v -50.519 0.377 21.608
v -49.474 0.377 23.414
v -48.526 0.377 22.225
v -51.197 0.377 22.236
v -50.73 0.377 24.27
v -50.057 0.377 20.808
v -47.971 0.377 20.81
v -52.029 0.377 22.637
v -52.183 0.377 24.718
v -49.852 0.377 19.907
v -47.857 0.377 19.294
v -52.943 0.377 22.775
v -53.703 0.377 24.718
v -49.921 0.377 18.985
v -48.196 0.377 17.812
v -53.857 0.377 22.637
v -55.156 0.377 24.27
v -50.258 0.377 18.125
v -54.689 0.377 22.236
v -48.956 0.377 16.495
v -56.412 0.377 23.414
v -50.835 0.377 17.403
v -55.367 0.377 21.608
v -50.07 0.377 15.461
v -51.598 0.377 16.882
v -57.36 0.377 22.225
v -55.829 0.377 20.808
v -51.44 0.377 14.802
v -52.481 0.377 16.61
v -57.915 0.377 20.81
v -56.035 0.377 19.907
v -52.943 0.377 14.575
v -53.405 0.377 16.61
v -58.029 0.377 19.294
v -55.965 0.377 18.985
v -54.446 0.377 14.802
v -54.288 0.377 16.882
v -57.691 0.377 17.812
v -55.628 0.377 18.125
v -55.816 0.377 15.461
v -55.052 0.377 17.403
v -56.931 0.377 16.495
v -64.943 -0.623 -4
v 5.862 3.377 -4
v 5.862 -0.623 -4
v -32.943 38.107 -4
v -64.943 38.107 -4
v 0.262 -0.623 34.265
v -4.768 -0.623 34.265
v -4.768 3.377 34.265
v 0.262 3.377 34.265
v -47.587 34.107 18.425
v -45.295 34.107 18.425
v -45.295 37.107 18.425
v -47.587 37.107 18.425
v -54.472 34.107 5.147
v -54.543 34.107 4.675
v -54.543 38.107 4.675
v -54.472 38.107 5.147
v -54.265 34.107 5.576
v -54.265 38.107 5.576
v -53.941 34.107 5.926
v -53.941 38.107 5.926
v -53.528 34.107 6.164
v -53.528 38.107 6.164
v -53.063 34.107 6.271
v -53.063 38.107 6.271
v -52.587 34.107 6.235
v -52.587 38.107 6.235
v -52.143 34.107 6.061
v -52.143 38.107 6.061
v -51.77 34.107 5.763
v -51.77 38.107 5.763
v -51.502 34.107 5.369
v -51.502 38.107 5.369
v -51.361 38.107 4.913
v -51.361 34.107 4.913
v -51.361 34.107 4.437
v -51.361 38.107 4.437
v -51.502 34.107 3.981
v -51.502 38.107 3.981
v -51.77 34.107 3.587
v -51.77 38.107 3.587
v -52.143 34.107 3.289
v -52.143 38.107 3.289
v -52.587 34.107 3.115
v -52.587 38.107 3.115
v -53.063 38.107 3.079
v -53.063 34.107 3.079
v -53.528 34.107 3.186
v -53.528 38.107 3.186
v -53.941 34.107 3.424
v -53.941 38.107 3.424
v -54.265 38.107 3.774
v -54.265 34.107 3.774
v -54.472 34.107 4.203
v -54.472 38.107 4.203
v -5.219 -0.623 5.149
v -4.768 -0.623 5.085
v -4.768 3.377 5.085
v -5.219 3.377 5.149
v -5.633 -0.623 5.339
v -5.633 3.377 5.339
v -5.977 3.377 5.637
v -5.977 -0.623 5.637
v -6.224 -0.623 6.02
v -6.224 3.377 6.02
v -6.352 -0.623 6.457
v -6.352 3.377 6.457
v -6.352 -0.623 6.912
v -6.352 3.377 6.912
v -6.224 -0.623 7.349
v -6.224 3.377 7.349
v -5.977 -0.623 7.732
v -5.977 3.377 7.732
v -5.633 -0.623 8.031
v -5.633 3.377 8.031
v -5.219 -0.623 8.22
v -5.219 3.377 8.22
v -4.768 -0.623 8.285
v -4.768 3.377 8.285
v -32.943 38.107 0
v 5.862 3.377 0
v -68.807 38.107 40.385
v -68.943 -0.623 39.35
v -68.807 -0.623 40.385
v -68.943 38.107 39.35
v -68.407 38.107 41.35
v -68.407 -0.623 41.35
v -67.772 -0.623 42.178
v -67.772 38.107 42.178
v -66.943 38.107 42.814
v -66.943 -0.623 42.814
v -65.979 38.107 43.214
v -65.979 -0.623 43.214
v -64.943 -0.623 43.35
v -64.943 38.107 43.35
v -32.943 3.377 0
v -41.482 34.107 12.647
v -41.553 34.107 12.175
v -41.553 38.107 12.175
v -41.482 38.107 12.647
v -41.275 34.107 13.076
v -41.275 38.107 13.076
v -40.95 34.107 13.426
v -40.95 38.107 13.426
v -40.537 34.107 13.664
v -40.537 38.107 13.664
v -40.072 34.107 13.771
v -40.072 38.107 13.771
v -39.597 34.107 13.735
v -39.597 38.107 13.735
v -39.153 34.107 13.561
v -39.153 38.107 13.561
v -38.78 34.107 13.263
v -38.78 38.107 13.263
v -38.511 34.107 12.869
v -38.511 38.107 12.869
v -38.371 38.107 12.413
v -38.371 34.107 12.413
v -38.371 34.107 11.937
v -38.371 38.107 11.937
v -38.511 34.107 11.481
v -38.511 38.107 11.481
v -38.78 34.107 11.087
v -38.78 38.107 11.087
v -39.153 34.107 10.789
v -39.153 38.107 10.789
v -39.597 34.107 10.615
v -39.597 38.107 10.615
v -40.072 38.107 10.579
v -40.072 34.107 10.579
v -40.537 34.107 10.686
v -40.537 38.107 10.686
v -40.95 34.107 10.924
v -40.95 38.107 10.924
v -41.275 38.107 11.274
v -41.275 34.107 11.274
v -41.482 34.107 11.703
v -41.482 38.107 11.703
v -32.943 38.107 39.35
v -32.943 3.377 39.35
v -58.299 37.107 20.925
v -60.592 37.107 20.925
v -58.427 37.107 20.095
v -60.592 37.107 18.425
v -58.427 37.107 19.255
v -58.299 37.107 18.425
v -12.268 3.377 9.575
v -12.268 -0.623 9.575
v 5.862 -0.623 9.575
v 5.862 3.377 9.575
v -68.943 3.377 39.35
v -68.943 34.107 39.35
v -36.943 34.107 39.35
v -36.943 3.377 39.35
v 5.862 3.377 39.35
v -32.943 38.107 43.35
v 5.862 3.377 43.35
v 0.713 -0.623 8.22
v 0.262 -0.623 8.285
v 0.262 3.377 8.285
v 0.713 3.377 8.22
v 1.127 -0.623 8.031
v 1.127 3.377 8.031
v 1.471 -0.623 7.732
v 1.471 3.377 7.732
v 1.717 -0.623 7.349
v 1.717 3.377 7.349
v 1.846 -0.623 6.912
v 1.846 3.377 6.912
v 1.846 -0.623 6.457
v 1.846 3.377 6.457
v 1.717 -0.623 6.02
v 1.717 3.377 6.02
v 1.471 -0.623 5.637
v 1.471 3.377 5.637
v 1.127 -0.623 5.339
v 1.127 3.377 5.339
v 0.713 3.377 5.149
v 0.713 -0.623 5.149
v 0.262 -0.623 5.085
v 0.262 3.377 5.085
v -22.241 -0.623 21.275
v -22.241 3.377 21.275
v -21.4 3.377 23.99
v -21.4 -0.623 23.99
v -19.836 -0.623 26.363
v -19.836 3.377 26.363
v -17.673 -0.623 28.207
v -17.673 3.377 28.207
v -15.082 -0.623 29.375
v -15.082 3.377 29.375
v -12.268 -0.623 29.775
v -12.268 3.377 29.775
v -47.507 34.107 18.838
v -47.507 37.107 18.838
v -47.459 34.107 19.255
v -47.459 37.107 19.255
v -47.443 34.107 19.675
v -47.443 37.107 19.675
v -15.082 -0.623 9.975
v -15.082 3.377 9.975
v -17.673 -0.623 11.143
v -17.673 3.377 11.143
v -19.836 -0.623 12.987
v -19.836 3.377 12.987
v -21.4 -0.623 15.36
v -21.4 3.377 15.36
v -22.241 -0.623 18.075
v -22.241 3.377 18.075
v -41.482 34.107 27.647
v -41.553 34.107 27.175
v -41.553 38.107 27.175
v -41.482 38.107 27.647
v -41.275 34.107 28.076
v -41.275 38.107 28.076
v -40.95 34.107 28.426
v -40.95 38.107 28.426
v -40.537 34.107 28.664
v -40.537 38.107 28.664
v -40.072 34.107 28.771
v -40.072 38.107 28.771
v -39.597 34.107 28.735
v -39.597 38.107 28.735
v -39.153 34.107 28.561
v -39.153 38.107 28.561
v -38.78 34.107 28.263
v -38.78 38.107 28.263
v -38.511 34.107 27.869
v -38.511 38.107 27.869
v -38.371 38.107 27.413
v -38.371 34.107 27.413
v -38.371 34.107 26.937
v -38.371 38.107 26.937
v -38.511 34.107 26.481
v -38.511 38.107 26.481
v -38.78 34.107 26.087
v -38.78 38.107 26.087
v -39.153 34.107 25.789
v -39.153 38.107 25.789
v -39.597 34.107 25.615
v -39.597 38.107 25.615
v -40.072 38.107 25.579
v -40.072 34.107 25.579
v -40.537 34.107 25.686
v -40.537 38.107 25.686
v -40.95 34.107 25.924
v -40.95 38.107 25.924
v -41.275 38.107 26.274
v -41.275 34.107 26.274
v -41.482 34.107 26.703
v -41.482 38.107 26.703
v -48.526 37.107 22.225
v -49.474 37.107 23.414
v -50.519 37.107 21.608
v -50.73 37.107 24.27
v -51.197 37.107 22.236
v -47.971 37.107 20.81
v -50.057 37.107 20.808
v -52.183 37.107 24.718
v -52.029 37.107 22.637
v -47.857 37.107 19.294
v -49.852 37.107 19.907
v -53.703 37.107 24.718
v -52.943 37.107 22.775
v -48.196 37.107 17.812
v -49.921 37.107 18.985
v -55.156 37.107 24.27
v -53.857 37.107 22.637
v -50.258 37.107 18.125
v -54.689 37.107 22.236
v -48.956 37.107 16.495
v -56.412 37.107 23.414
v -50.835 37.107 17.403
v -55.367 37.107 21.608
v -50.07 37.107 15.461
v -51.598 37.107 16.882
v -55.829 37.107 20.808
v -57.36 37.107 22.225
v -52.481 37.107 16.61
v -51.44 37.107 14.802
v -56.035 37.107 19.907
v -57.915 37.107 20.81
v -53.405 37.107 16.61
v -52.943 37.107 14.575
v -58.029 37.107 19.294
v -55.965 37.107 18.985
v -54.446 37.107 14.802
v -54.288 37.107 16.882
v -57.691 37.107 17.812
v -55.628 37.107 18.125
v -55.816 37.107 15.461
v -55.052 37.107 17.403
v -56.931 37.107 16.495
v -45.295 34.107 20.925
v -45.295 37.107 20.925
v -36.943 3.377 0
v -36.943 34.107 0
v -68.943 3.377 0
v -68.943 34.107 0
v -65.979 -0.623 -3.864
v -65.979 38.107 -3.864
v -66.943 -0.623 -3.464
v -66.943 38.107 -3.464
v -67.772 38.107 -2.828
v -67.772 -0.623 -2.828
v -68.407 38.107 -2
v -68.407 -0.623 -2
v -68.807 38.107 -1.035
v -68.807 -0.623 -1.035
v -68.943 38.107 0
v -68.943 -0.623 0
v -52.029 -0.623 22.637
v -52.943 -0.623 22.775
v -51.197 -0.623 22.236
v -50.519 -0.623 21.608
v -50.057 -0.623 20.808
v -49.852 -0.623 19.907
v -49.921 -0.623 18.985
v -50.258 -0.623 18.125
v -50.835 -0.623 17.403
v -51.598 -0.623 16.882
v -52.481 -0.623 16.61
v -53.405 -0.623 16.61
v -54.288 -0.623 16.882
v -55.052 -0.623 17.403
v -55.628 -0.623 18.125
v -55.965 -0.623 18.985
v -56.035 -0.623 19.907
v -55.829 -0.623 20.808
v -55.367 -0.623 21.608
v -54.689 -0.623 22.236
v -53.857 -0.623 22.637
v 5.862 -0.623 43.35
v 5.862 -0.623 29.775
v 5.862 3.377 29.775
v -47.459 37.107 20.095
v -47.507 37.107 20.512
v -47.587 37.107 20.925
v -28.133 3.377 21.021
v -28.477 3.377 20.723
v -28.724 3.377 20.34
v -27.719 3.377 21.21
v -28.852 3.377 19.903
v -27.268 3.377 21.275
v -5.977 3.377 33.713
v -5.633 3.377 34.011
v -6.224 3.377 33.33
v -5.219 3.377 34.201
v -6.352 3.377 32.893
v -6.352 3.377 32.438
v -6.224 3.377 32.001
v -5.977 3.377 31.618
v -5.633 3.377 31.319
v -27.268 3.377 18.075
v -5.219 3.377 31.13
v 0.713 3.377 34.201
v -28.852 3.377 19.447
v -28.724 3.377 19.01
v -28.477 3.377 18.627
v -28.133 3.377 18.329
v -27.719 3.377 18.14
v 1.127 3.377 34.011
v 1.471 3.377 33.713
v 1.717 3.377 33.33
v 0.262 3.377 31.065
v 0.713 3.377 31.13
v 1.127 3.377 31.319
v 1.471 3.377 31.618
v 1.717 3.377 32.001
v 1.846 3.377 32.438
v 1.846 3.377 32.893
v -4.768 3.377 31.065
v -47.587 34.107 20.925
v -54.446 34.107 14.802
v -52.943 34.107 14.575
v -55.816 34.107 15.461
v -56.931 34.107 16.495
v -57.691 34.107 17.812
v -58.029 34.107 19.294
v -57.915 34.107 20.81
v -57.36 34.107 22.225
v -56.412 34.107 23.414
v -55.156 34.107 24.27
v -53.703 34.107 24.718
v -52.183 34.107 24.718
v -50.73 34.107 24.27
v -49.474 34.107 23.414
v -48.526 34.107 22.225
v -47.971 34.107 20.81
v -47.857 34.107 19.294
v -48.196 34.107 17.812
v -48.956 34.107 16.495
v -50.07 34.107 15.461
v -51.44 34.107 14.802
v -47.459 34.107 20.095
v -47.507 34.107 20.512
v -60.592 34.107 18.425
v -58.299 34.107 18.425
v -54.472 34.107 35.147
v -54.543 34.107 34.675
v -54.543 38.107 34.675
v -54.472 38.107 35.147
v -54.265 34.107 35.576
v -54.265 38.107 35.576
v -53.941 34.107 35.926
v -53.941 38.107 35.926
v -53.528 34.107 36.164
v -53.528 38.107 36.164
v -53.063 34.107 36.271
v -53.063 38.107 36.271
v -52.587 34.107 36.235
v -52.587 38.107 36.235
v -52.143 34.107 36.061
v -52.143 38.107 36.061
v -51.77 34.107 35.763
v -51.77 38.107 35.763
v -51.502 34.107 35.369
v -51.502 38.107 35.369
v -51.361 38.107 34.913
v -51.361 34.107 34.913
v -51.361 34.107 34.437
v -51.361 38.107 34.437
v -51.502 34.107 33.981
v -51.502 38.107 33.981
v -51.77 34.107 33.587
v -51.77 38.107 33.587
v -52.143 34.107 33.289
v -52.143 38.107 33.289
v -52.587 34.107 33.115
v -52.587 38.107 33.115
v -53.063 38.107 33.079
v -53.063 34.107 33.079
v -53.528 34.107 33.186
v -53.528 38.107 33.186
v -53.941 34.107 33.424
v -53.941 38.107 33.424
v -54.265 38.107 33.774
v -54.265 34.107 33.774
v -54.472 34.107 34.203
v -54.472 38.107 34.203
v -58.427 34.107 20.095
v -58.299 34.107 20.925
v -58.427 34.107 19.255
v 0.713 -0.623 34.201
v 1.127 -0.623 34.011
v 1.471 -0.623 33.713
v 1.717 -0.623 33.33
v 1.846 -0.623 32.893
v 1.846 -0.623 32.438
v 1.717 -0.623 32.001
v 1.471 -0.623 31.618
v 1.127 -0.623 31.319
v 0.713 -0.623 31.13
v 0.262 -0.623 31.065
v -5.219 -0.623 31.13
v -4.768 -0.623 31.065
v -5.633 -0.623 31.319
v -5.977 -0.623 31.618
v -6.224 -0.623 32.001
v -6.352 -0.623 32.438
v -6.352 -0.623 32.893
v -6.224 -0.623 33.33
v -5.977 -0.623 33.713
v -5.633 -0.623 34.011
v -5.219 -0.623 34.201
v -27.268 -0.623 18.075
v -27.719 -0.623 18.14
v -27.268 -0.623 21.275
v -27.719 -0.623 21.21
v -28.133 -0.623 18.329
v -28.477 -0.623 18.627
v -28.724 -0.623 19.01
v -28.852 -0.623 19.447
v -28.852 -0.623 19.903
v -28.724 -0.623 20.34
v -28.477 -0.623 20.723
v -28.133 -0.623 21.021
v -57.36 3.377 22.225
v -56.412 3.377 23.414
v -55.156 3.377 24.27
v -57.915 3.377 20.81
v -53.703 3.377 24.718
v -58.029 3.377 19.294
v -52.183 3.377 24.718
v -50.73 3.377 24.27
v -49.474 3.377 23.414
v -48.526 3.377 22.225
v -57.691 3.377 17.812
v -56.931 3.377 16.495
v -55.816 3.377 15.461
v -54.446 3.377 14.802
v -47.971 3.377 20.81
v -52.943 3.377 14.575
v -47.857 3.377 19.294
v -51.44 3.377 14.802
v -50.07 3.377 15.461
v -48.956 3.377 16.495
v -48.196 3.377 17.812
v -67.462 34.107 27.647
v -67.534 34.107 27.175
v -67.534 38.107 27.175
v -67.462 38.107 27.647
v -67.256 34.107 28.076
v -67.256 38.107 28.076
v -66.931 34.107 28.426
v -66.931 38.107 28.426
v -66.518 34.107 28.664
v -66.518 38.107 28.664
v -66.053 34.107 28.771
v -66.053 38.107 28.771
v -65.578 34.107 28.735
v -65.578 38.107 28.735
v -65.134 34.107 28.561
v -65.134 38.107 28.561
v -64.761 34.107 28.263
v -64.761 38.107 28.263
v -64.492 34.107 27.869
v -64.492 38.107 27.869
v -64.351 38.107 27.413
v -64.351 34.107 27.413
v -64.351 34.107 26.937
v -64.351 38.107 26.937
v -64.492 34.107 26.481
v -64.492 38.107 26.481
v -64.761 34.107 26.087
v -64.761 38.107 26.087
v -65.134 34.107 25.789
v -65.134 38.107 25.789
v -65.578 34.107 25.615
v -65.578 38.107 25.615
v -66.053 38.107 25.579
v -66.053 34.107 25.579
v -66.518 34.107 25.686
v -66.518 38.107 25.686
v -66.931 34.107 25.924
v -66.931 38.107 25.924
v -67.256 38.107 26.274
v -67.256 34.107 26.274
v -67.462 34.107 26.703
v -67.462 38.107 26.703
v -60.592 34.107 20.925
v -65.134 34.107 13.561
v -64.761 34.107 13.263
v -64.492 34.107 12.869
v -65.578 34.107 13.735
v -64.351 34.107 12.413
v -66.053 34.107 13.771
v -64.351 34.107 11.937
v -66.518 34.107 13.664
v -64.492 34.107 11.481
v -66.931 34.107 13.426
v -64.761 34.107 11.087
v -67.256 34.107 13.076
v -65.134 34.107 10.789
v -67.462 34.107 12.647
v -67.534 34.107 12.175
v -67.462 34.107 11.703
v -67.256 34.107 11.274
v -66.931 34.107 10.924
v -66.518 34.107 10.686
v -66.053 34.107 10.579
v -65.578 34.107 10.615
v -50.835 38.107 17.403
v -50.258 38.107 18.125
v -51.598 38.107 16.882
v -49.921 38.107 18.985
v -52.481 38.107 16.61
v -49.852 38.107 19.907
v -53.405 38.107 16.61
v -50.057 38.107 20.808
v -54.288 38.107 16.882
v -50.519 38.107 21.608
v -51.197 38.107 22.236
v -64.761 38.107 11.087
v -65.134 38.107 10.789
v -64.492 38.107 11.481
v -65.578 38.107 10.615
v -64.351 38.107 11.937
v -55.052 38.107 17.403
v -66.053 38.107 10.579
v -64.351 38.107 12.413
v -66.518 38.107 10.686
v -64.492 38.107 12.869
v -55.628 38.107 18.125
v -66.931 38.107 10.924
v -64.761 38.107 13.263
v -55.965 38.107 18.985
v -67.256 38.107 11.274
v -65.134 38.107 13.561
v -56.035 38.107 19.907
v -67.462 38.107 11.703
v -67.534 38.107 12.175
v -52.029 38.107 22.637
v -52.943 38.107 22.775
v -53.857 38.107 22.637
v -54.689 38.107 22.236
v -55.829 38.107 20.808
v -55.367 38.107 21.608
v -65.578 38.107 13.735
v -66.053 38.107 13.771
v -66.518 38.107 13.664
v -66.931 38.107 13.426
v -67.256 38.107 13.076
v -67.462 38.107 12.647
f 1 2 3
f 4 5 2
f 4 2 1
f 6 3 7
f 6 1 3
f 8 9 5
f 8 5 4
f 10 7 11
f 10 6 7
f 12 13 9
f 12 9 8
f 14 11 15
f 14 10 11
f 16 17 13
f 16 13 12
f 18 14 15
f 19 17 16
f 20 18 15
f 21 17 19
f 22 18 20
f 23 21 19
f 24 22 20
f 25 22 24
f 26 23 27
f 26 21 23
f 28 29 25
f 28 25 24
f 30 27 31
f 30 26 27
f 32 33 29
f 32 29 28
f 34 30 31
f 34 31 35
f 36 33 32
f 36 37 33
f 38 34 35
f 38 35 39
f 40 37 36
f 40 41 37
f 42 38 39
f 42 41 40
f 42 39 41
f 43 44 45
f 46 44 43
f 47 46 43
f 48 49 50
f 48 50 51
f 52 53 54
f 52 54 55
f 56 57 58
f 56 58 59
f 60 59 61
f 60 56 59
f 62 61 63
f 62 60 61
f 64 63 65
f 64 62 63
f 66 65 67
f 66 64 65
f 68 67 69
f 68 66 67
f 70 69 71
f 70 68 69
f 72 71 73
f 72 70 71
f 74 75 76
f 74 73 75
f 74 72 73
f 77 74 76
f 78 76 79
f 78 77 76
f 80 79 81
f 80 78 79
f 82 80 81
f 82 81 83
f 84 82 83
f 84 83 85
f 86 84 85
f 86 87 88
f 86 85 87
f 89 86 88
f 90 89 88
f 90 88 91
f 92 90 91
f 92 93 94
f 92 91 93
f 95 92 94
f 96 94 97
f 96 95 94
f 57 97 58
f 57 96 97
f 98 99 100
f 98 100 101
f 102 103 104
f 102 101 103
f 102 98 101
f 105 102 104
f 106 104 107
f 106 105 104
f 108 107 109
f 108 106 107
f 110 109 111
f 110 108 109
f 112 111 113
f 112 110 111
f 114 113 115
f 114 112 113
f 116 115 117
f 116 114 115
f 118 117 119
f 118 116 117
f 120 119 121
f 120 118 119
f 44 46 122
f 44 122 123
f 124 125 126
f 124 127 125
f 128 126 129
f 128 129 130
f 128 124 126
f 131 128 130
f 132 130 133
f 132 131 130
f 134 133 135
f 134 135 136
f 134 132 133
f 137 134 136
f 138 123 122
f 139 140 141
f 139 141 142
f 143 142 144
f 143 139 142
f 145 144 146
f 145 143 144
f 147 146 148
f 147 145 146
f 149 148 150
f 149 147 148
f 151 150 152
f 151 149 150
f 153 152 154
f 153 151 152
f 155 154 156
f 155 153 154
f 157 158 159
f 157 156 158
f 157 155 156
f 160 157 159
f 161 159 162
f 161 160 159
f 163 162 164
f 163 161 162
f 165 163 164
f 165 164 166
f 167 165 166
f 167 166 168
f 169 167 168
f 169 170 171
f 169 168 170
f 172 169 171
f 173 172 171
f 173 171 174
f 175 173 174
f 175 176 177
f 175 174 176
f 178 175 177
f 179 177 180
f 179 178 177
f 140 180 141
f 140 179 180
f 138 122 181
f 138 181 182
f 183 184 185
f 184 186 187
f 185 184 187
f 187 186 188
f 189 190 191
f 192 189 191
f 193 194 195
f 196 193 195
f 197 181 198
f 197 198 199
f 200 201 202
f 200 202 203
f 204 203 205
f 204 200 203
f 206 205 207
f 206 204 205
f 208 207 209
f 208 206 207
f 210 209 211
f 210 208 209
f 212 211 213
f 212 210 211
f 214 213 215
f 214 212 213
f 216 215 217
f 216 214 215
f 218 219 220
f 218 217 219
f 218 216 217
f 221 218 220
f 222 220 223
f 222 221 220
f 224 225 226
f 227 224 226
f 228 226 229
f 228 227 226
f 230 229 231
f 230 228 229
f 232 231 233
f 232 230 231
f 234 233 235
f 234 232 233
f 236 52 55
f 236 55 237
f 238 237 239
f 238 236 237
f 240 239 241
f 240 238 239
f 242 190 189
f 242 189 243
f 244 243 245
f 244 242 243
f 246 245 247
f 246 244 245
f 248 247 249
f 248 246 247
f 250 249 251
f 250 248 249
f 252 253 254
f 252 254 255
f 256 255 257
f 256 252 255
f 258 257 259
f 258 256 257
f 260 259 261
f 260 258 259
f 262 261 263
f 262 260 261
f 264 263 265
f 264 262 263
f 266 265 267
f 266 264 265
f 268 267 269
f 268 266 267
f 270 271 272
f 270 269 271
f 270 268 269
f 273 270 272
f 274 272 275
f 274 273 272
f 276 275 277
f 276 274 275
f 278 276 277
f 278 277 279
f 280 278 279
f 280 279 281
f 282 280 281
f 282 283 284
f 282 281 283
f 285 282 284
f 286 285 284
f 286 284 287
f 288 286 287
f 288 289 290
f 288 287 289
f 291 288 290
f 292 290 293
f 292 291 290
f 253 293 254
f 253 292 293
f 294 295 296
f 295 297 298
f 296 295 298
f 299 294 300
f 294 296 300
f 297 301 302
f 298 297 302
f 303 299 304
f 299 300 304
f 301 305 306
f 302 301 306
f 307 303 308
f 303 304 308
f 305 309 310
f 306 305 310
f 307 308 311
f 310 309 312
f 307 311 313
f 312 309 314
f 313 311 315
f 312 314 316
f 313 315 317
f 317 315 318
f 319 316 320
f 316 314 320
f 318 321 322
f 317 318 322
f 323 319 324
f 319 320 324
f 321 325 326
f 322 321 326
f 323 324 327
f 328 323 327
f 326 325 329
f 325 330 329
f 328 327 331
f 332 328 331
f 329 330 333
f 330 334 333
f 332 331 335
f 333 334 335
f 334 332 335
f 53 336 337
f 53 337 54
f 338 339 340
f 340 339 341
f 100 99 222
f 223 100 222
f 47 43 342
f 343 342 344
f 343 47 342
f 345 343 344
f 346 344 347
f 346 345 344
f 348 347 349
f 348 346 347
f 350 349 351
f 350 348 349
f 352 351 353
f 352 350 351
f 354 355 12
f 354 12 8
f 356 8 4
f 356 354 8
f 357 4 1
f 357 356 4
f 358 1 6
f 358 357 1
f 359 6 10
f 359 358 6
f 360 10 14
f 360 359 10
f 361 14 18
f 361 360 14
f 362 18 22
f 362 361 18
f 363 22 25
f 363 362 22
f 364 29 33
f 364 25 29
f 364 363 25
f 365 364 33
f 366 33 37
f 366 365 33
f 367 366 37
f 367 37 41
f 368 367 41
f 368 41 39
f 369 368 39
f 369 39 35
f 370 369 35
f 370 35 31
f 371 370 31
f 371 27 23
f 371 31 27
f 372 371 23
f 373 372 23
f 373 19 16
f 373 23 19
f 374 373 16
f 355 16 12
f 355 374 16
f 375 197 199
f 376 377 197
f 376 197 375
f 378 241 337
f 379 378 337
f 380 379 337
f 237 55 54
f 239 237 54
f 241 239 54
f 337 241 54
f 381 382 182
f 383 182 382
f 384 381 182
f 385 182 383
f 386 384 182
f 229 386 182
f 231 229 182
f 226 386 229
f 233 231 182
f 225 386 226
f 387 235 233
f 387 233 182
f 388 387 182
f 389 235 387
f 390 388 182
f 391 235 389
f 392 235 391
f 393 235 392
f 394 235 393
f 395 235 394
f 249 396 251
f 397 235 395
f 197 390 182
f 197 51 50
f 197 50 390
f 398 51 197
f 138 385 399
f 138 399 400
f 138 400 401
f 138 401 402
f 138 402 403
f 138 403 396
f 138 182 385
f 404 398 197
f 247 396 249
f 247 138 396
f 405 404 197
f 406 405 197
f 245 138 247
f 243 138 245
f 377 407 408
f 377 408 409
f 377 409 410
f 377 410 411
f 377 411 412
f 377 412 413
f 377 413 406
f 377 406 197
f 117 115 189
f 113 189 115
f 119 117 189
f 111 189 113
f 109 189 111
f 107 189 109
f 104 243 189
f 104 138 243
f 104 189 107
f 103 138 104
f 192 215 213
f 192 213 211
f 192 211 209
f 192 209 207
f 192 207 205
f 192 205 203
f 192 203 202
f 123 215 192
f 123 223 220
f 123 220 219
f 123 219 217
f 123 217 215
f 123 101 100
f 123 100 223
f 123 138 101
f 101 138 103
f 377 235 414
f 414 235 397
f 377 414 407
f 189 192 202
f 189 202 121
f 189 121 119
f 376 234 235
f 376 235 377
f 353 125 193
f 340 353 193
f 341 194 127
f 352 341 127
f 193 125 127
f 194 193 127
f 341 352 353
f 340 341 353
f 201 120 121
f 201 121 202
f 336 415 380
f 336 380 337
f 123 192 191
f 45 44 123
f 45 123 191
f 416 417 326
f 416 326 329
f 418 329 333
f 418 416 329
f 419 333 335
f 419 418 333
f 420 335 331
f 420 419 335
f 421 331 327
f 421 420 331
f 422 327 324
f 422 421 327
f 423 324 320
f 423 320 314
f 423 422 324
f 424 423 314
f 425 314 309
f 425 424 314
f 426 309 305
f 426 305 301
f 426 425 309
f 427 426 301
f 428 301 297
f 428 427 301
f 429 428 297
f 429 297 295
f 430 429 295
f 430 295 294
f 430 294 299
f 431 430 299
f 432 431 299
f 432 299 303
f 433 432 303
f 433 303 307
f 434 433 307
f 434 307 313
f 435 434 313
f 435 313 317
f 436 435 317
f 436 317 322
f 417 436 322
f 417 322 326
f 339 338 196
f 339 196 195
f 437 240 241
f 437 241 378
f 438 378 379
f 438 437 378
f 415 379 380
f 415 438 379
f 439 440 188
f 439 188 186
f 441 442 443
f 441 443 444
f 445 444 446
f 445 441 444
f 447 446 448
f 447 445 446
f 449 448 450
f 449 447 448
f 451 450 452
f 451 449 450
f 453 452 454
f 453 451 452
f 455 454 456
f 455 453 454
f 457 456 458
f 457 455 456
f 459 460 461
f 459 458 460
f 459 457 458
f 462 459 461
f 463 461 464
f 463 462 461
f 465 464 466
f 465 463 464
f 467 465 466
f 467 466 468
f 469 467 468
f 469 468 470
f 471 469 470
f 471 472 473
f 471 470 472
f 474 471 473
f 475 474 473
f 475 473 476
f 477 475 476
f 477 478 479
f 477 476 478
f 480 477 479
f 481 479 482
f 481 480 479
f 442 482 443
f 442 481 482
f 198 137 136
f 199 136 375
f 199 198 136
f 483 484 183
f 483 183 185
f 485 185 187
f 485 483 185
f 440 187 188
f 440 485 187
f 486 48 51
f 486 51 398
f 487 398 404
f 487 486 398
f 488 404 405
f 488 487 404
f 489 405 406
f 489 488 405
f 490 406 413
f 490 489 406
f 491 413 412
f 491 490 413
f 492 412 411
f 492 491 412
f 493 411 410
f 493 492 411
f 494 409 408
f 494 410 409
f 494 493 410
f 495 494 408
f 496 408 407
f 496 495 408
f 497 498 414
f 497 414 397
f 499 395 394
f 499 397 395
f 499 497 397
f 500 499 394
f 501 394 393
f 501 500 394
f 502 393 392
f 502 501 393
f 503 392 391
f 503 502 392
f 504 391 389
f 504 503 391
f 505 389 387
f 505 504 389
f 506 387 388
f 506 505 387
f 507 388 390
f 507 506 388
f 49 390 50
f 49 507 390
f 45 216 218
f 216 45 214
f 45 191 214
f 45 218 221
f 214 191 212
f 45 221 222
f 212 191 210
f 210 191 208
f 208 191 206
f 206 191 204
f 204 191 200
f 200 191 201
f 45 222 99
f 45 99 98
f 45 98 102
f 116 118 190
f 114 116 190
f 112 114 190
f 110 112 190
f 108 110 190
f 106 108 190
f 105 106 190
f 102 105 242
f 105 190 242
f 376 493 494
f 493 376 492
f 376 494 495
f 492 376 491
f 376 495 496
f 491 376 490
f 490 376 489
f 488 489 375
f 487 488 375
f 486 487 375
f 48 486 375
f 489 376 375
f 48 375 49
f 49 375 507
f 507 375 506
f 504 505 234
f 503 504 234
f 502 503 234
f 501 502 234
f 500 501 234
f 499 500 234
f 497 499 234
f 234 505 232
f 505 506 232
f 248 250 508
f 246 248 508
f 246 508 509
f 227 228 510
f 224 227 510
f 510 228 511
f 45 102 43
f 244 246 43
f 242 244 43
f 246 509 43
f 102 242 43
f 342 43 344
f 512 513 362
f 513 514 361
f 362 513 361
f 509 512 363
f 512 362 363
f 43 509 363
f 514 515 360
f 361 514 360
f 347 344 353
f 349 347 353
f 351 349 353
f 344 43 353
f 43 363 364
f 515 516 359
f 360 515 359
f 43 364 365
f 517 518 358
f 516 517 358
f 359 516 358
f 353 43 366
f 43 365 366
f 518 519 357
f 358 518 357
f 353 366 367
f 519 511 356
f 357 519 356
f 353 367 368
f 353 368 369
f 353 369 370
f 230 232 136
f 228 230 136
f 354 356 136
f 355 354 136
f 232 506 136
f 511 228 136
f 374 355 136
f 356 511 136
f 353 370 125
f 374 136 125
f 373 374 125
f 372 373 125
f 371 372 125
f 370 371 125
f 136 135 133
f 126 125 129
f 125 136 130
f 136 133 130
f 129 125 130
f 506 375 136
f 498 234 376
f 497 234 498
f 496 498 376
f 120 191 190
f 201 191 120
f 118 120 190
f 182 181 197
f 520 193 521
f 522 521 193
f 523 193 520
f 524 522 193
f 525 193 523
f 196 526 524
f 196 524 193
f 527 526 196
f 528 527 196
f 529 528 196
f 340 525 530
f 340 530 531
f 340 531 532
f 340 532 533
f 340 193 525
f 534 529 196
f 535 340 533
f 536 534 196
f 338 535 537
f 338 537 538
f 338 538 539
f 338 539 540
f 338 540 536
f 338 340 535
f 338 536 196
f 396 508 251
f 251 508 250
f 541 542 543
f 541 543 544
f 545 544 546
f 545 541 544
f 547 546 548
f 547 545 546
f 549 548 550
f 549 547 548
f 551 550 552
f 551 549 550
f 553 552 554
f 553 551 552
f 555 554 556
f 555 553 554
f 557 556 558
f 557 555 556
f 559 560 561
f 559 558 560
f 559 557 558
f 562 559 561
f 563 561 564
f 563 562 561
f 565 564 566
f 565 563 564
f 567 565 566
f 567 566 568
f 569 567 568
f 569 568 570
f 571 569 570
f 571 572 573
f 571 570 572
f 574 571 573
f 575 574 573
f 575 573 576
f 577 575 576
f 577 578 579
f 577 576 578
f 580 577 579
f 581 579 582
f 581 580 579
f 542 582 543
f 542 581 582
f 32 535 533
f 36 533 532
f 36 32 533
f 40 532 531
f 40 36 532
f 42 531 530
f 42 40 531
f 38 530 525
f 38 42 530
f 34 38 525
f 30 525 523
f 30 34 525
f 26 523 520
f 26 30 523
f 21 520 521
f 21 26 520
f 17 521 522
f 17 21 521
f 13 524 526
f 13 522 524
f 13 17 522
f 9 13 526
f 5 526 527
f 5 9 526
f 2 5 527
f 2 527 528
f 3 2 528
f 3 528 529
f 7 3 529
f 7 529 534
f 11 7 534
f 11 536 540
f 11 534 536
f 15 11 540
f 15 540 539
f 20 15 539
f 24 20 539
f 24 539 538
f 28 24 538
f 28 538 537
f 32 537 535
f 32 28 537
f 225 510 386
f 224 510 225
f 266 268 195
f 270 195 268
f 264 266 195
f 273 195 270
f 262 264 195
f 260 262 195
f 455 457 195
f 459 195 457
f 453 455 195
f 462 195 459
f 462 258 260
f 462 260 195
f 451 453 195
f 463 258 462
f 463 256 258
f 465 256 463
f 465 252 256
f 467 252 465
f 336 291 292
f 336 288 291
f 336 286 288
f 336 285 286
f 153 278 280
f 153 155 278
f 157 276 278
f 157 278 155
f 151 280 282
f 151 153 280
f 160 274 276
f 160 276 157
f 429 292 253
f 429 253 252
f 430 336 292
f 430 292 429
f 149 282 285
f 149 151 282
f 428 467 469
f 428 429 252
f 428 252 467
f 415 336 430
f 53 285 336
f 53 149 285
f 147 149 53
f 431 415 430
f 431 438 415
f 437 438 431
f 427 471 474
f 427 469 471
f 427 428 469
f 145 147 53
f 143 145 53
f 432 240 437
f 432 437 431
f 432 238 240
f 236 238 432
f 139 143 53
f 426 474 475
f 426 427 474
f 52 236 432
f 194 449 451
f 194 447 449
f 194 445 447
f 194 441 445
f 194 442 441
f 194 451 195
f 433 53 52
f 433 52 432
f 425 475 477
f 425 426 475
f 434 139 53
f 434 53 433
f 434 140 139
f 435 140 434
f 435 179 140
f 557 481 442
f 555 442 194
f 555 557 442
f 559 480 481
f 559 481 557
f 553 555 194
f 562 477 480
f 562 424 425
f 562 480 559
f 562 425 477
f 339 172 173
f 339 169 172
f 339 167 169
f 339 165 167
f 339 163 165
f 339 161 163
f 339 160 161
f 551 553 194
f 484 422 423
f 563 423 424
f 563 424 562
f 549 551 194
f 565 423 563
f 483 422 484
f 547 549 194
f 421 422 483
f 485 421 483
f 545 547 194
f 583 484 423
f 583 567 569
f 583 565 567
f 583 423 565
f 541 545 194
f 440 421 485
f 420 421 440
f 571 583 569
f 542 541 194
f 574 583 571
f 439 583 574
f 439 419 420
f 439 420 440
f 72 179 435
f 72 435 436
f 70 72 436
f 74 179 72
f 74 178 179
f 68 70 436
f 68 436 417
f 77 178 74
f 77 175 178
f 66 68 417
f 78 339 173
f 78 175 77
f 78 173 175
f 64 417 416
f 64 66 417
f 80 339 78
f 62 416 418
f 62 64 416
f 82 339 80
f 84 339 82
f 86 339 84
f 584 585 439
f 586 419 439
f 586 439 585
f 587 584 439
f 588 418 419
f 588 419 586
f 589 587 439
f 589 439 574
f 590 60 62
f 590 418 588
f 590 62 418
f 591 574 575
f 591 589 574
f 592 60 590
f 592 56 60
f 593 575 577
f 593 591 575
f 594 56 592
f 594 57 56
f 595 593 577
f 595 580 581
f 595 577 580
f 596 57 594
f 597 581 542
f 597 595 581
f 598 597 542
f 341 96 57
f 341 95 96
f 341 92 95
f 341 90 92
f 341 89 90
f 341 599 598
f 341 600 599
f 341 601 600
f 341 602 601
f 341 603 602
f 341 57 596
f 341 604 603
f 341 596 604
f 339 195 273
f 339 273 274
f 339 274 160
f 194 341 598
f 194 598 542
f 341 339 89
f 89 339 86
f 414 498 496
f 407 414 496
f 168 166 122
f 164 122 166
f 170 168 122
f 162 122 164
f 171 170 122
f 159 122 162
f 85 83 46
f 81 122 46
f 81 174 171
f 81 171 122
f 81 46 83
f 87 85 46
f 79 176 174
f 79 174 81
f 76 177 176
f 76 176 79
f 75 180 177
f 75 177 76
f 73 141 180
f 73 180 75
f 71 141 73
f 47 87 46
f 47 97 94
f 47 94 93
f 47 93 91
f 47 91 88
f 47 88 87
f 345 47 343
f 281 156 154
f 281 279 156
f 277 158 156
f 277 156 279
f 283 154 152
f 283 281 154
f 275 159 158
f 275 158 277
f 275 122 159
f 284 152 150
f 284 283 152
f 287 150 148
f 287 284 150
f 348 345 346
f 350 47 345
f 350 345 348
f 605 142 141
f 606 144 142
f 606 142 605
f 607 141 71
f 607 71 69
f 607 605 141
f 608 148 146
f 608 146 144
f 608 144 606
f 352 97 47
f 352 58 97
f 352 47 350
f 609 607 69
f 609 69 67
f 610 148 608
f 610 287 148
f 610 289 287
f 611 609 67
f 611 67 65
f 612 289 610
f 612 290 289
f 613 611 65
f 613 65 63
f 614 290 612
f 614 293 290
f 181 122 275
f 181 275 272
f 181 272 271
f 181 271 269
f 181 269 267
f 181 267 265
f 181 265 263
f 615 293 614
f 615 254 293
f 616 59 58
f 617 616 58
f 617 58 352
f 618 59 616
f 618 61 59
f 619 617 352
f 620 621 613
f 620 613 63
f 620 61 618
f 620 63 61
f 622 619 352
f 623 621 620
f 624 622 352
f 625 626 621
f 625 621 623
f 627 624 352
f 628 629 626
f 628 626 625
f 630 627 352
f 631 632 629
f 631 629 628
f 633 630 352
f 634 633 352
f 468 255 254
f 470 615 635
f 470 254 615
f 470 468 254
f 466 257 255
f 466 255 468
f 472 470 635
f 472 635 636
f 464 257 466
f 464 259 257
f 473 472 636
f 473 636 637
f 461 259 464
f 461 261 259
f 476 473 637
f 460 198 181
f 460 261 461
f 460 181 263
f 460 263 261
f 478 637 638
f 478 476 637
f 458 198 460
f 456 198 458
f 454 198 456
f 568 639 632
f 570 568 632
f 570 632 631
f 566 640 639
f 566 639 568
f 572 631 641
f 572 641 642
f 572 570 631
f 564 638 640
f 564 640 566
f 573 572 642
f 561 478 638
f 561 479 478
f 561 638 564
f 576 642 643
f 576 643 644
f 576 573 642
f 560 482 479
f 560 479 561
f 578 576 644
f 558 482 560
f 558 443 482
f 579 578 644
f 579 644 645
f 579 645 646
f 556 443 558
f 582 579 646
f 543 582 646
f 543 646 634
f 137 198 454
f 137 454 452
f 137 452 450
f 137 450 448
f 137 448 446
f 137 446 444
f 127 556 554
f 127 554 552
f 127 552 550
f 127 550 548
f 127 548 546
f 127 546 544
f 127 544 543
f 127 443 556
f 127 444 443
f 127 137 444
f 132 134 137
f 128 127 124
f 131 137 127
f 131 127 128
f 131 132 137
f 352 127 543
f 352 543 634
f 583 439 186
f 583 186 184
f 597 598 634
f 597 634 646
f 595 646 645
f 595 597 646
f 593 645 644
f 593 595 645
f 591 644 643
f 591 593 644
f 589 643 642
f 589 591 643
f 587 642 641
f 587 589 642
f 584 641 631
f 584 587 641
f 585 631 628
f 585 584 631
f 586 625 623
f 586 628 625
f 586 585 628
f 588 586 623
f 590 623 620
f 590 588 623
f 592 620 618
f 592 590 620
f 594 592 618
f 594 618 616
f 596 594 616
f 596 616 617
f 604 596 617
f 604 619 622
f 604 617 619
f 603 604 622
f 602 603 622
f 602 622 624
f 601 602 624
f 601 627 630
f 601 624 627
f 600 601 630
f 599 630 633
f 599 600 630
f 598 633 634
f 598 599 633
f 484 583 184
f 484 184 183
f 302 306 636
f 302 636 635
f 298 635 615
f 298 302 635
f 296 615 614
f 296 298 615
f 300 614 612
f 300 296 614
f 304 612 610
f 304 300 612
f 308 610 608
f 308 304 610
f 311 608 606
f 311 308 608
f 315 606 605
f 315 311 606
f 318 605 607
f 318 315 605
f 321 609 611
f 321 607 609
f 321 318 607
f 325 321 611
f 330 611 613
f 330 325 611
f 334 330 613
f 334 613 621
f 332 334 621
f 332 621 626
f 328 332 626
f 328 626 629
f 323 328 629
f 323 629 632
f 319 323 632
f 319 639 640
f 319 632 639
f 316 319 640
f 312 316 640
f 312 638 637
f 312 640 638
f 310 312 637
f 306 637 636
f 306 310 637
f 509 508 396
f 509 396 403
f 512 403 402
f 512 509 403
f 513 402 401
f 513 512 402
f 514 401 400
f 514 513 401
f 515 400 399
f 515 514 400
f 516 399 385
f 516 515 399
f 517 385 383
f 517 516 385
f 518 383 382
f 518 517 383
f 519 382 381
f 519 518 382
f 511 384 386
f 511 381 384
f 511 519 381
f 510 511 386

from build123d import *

# Parameters (mm, degrees)
BOSS_EXTRUDE1_DEPTH     = 39.35
CUT_EXTRUDE2_DEPTH      = 33.73
CUT_EXTRUDE2_DEPTH_BACK = 3
SKETCH3_R               = 5.1
CUT_EXTRUDE3_DEPTH      = 33.73
CUT_EXTRUDE4_DEPTH      = 87.647311883
CUT_EXTRUDE4_DEPTH_BACK = 87.647311883
SKETCH3_5_R             = 3.1
SKETCH3_5_R_2           = 10.1
SKETCH3_5_R_3           = 1.6
SKETCH3_5_W             = 20.675
SKETCH3_5_H             = 20.2
SKETCH3_5_W_2           = 5.027537917
SKETCH3_5_H_2           = 3.2
SKETCH3_5_W_3           = 5.03
SKETCH3_6_R             = 1.6
CUT_EXTRUDE5_DEPTH      = 87.647311883
SKETCH4_W               = 77.35
SKETCH4_H               = 38.73
BOSS_EXTRUDE2_DEPTH     = 4
SKETCH5_W               = 77.35
SKETCH5_H               = 38.73
BOSS_EXTRUDE3_DEPTH     = 4
CUT_EXTRUDE6_DEPTH      = 92.909209967
CUT_EXTRUDE6_DEPTH_BACK = 92.909209967
FILLET1_R               = 4


with BuildPart() as part:
    # Sketch1 → Boss-Extrude1 (new body)
    with BuildSketch(Plane.XY):
        Polygon((-68.943174111, 38.106680783), (-32.943174111, 38.106680783), (-32.943174111, 3.376680783), (8.406825889, 3.376680783), (8.406825889, -0.623319217), (-68.943174111, -0.623319217), (-68.943174111, 3.376680783), (-36.943174111, 3.376680783), (-36.943174111, 34.106680783), (-68.943174111, 34.106680783), align=None)
    extrude(amount=BOSS_EXTRUDE1_DEPTH)

    # Sketch3 → Cut-Extrude2 (cut, two sides: drawn at the far end of the back side and taken through both)
    with BuildSketch(Plane(origin=(0, 3.376680783, 0), x_dir=(1, 0, 0), z_dir=(0, 1, 0)).offset(-CUT_EXTRUDE2_DEPTH_BACK)):
        with Locations(Location((-52.943174111, -19.675, 0), (0, 0, 90))):
            Circle(SKETCH3_R)
    extrude(amount=CUT_EXTRUDE2_DEPTH + CUT_EXTRUDE2_DEPTH_BACK, mode=Mode.SUBTRACT)

    # Sketch3<4> → Cut-Extrude3 (cut)
    with BuildSketch(Plane(origin=(0, 3.376680783, 0), x_dir=(1, 0, 0), z_dir=(0, 1, 0))):
        with BuildLine():
            Line((-47.58710279, -20.925), (-45.294644841, -20.925))
            Line((-45.294644841, -20.925), (-45.294644841, -18.425))
            Line((-45.294644841, -18.425), (-47.58710279, -18.425))
            ThreePointArc((-47.58710279, -18.425), (-47.479274758, -19.045870549), (-47.443174111, -19.675))
            ThreePointArc((-47.443174111, -19.675), (-47.479274758, -20.304129451), (-47.58710279, -20.925))
        make_face()
        with BuildLine():
            Line((-60.591703381, -18.425), (-60.591703381, -20.925))
            Line((-60.591703381, -20.925), (-58.299245432, -20.925))
            ThreePointArc((-58.299245432, -20.925), (-58.443174111, -19.675), (-58.299245432, -18.425))
            Line((-58.299245432, -18.425), (-60.591703381, -18.425))
        make_face()
    extrude(amount=CUT_EXTRUDE3_DEPTH, mode=Mode.SUBTRACT)

    # Sketch3<5> → Cut-Extrude4 (cut, two sides: drawn at the far end of the back side and taken through both)
    with BuildSketch(Plane(origin=(0, 3.376680783, 0), x_dir=(1, 0, 0), z_dir=(0, 1, 0)).offset(-CUT_EXTRUDE4_DEPTH_BACK)):
        with Locations(Location((-52.943174111, -19.675, 0), (0, 0, 270))):
            Circle(SKETCH3_5_R)
        with Locations((-12.268174111, -19.675)):
            Circle(SKETCH3_5_R_2)
        with Locations((-4.768174111, -32.665381057)):
            Circle(SKETCH3_5_R_3)
        with Locations((-4.768174111, -6.684618943)):
            Circle(SKETCH3_5_R_3)
        with Locations((-27.268174111, -19.675)):
            Circle(SKETCH3_5_R_3)
        with Locations((0.261825889, -32.665381057)):
            Circle(SKETCH3_5_R_3)
        with Locations((0.261825889, -6.684618943)):
            Circle(SKETCH3_5_R_3)
        with Locations((-1.930674111, -19.675)):
            Rectangle(SKETCH3_5_W, SKETCH3_5_H)
        with Locations((-24.754405152, -19.675)):
            Rectangle(SKETCH3_5_W_2, SKETCH3_5_H_2)
        with Locations((-2.253174111, -32.665381057)):
            Rectangle(SKETCH3_5_W_3, SKETCH3_5_H_2)
        with Locations((-2.253174111, -6.684618943)):
            Rectangle(SKETCH3_5_W_3, SKETCH3_5_H_2)
    extrude(amount=CUT_EXTRUDE4_DEPTH + CUT_EXTRUDE4_DEPTH_BACK, mode=Mode.SUBTRACT)

    # Sketch3<6> → Cut-Extrude5 (cut, through all)
    with BuildSketch(Plane(origin=(0, 3.376680783, 0), x_dir=(1, 0, 0), z_dir=(0, 1, 0))):
        with Locations(Location((-52.943174111, -34.675, 0), (0, 0, 180))):
            Circle(SKETCH3_6_R)
        with Locations(Location((-65.933555168, -27.175, 0), (0, 0, 180))):
            Circle(SKETCH3_6_R)
        with Locations(Location((-65.933555168, -12.175, 0), (0, 0, 180))):
            Circle(SKETCH3_6_R)
        with Locations(Location((-52.943174111, -4.675, 0), (0, 0, 180))):
            Circle(SKETCH3_6_R)
        with Locations(Location((-39.952793054, -12.175, 0), (0, 0, 180))):
            Circle(SKETCH3_6_R)
        with Locations(Location((-39.952793054, -27.175, 0), (0, 0, 180))):
            Circle(SKETCH3_6_R)
    extrude(amount=CUT_EXTRUDE5_DEPTH, mode=Mode.SUBTRACT)

    # Sketch4 → Boss-Extrude2 (add)
    with BuildSketch(Plane.XY.offset(39.35)):
        with Locations((-30.268174111, 18.741680783)):
            Rectangle(SKETCH4_W, SKETCH4_H)
    extrude(amount=BOSS_EXTRUDE2_DEPTH)

    # Sketch5 → Boss-Extrude3 (add)
    with BuildSketch(Plane(origin=(0, 0, 0), x_dir=(-1, 0, 0), z_dir=(0, 0, -1))):
        with Locations((30.268174111, 18.741680783)):
            Rectangle(SKETCH5_W, SKETCH5_H)
    extrude(amount=BOSS_EXTRUDE3_DEPTH)

    # Sketch6 → Cut-Extrude6 (cut, two sides: drawn at the far end of the back side and taken through both)
    with BuildSketch(Plane.XY.offset(43.35).offset(-CUT_EXTRUDE6_DEPTH_BACK)):
        Polygon((-32.943174111, 38.106680783), (5.861825889, 3.376680783), (5.861825889, -0.623319217), (8.406825889, -0.623319217), (8.406825889, 38.106680783), align=None)
    extrude(amount=CUT_EXTRUDE6_DEPTH + CUT_EXTRUDE6_DEPTH_BACK, mode=Mode.SUBTRACT)

    # Fillet1
    fillet1_edges = [part.edges().sort_by_distance(p)[0] for p in [
        (-68.943174111, 18.741680783, 43.35),
        (-68.943174111, 18.741680783, -4),
    ]]
    fillet(fillet1_edges, radius=FILLET1_R - 0.0001)  # a hair under: the kernel refuses the full size


solid = part.part
